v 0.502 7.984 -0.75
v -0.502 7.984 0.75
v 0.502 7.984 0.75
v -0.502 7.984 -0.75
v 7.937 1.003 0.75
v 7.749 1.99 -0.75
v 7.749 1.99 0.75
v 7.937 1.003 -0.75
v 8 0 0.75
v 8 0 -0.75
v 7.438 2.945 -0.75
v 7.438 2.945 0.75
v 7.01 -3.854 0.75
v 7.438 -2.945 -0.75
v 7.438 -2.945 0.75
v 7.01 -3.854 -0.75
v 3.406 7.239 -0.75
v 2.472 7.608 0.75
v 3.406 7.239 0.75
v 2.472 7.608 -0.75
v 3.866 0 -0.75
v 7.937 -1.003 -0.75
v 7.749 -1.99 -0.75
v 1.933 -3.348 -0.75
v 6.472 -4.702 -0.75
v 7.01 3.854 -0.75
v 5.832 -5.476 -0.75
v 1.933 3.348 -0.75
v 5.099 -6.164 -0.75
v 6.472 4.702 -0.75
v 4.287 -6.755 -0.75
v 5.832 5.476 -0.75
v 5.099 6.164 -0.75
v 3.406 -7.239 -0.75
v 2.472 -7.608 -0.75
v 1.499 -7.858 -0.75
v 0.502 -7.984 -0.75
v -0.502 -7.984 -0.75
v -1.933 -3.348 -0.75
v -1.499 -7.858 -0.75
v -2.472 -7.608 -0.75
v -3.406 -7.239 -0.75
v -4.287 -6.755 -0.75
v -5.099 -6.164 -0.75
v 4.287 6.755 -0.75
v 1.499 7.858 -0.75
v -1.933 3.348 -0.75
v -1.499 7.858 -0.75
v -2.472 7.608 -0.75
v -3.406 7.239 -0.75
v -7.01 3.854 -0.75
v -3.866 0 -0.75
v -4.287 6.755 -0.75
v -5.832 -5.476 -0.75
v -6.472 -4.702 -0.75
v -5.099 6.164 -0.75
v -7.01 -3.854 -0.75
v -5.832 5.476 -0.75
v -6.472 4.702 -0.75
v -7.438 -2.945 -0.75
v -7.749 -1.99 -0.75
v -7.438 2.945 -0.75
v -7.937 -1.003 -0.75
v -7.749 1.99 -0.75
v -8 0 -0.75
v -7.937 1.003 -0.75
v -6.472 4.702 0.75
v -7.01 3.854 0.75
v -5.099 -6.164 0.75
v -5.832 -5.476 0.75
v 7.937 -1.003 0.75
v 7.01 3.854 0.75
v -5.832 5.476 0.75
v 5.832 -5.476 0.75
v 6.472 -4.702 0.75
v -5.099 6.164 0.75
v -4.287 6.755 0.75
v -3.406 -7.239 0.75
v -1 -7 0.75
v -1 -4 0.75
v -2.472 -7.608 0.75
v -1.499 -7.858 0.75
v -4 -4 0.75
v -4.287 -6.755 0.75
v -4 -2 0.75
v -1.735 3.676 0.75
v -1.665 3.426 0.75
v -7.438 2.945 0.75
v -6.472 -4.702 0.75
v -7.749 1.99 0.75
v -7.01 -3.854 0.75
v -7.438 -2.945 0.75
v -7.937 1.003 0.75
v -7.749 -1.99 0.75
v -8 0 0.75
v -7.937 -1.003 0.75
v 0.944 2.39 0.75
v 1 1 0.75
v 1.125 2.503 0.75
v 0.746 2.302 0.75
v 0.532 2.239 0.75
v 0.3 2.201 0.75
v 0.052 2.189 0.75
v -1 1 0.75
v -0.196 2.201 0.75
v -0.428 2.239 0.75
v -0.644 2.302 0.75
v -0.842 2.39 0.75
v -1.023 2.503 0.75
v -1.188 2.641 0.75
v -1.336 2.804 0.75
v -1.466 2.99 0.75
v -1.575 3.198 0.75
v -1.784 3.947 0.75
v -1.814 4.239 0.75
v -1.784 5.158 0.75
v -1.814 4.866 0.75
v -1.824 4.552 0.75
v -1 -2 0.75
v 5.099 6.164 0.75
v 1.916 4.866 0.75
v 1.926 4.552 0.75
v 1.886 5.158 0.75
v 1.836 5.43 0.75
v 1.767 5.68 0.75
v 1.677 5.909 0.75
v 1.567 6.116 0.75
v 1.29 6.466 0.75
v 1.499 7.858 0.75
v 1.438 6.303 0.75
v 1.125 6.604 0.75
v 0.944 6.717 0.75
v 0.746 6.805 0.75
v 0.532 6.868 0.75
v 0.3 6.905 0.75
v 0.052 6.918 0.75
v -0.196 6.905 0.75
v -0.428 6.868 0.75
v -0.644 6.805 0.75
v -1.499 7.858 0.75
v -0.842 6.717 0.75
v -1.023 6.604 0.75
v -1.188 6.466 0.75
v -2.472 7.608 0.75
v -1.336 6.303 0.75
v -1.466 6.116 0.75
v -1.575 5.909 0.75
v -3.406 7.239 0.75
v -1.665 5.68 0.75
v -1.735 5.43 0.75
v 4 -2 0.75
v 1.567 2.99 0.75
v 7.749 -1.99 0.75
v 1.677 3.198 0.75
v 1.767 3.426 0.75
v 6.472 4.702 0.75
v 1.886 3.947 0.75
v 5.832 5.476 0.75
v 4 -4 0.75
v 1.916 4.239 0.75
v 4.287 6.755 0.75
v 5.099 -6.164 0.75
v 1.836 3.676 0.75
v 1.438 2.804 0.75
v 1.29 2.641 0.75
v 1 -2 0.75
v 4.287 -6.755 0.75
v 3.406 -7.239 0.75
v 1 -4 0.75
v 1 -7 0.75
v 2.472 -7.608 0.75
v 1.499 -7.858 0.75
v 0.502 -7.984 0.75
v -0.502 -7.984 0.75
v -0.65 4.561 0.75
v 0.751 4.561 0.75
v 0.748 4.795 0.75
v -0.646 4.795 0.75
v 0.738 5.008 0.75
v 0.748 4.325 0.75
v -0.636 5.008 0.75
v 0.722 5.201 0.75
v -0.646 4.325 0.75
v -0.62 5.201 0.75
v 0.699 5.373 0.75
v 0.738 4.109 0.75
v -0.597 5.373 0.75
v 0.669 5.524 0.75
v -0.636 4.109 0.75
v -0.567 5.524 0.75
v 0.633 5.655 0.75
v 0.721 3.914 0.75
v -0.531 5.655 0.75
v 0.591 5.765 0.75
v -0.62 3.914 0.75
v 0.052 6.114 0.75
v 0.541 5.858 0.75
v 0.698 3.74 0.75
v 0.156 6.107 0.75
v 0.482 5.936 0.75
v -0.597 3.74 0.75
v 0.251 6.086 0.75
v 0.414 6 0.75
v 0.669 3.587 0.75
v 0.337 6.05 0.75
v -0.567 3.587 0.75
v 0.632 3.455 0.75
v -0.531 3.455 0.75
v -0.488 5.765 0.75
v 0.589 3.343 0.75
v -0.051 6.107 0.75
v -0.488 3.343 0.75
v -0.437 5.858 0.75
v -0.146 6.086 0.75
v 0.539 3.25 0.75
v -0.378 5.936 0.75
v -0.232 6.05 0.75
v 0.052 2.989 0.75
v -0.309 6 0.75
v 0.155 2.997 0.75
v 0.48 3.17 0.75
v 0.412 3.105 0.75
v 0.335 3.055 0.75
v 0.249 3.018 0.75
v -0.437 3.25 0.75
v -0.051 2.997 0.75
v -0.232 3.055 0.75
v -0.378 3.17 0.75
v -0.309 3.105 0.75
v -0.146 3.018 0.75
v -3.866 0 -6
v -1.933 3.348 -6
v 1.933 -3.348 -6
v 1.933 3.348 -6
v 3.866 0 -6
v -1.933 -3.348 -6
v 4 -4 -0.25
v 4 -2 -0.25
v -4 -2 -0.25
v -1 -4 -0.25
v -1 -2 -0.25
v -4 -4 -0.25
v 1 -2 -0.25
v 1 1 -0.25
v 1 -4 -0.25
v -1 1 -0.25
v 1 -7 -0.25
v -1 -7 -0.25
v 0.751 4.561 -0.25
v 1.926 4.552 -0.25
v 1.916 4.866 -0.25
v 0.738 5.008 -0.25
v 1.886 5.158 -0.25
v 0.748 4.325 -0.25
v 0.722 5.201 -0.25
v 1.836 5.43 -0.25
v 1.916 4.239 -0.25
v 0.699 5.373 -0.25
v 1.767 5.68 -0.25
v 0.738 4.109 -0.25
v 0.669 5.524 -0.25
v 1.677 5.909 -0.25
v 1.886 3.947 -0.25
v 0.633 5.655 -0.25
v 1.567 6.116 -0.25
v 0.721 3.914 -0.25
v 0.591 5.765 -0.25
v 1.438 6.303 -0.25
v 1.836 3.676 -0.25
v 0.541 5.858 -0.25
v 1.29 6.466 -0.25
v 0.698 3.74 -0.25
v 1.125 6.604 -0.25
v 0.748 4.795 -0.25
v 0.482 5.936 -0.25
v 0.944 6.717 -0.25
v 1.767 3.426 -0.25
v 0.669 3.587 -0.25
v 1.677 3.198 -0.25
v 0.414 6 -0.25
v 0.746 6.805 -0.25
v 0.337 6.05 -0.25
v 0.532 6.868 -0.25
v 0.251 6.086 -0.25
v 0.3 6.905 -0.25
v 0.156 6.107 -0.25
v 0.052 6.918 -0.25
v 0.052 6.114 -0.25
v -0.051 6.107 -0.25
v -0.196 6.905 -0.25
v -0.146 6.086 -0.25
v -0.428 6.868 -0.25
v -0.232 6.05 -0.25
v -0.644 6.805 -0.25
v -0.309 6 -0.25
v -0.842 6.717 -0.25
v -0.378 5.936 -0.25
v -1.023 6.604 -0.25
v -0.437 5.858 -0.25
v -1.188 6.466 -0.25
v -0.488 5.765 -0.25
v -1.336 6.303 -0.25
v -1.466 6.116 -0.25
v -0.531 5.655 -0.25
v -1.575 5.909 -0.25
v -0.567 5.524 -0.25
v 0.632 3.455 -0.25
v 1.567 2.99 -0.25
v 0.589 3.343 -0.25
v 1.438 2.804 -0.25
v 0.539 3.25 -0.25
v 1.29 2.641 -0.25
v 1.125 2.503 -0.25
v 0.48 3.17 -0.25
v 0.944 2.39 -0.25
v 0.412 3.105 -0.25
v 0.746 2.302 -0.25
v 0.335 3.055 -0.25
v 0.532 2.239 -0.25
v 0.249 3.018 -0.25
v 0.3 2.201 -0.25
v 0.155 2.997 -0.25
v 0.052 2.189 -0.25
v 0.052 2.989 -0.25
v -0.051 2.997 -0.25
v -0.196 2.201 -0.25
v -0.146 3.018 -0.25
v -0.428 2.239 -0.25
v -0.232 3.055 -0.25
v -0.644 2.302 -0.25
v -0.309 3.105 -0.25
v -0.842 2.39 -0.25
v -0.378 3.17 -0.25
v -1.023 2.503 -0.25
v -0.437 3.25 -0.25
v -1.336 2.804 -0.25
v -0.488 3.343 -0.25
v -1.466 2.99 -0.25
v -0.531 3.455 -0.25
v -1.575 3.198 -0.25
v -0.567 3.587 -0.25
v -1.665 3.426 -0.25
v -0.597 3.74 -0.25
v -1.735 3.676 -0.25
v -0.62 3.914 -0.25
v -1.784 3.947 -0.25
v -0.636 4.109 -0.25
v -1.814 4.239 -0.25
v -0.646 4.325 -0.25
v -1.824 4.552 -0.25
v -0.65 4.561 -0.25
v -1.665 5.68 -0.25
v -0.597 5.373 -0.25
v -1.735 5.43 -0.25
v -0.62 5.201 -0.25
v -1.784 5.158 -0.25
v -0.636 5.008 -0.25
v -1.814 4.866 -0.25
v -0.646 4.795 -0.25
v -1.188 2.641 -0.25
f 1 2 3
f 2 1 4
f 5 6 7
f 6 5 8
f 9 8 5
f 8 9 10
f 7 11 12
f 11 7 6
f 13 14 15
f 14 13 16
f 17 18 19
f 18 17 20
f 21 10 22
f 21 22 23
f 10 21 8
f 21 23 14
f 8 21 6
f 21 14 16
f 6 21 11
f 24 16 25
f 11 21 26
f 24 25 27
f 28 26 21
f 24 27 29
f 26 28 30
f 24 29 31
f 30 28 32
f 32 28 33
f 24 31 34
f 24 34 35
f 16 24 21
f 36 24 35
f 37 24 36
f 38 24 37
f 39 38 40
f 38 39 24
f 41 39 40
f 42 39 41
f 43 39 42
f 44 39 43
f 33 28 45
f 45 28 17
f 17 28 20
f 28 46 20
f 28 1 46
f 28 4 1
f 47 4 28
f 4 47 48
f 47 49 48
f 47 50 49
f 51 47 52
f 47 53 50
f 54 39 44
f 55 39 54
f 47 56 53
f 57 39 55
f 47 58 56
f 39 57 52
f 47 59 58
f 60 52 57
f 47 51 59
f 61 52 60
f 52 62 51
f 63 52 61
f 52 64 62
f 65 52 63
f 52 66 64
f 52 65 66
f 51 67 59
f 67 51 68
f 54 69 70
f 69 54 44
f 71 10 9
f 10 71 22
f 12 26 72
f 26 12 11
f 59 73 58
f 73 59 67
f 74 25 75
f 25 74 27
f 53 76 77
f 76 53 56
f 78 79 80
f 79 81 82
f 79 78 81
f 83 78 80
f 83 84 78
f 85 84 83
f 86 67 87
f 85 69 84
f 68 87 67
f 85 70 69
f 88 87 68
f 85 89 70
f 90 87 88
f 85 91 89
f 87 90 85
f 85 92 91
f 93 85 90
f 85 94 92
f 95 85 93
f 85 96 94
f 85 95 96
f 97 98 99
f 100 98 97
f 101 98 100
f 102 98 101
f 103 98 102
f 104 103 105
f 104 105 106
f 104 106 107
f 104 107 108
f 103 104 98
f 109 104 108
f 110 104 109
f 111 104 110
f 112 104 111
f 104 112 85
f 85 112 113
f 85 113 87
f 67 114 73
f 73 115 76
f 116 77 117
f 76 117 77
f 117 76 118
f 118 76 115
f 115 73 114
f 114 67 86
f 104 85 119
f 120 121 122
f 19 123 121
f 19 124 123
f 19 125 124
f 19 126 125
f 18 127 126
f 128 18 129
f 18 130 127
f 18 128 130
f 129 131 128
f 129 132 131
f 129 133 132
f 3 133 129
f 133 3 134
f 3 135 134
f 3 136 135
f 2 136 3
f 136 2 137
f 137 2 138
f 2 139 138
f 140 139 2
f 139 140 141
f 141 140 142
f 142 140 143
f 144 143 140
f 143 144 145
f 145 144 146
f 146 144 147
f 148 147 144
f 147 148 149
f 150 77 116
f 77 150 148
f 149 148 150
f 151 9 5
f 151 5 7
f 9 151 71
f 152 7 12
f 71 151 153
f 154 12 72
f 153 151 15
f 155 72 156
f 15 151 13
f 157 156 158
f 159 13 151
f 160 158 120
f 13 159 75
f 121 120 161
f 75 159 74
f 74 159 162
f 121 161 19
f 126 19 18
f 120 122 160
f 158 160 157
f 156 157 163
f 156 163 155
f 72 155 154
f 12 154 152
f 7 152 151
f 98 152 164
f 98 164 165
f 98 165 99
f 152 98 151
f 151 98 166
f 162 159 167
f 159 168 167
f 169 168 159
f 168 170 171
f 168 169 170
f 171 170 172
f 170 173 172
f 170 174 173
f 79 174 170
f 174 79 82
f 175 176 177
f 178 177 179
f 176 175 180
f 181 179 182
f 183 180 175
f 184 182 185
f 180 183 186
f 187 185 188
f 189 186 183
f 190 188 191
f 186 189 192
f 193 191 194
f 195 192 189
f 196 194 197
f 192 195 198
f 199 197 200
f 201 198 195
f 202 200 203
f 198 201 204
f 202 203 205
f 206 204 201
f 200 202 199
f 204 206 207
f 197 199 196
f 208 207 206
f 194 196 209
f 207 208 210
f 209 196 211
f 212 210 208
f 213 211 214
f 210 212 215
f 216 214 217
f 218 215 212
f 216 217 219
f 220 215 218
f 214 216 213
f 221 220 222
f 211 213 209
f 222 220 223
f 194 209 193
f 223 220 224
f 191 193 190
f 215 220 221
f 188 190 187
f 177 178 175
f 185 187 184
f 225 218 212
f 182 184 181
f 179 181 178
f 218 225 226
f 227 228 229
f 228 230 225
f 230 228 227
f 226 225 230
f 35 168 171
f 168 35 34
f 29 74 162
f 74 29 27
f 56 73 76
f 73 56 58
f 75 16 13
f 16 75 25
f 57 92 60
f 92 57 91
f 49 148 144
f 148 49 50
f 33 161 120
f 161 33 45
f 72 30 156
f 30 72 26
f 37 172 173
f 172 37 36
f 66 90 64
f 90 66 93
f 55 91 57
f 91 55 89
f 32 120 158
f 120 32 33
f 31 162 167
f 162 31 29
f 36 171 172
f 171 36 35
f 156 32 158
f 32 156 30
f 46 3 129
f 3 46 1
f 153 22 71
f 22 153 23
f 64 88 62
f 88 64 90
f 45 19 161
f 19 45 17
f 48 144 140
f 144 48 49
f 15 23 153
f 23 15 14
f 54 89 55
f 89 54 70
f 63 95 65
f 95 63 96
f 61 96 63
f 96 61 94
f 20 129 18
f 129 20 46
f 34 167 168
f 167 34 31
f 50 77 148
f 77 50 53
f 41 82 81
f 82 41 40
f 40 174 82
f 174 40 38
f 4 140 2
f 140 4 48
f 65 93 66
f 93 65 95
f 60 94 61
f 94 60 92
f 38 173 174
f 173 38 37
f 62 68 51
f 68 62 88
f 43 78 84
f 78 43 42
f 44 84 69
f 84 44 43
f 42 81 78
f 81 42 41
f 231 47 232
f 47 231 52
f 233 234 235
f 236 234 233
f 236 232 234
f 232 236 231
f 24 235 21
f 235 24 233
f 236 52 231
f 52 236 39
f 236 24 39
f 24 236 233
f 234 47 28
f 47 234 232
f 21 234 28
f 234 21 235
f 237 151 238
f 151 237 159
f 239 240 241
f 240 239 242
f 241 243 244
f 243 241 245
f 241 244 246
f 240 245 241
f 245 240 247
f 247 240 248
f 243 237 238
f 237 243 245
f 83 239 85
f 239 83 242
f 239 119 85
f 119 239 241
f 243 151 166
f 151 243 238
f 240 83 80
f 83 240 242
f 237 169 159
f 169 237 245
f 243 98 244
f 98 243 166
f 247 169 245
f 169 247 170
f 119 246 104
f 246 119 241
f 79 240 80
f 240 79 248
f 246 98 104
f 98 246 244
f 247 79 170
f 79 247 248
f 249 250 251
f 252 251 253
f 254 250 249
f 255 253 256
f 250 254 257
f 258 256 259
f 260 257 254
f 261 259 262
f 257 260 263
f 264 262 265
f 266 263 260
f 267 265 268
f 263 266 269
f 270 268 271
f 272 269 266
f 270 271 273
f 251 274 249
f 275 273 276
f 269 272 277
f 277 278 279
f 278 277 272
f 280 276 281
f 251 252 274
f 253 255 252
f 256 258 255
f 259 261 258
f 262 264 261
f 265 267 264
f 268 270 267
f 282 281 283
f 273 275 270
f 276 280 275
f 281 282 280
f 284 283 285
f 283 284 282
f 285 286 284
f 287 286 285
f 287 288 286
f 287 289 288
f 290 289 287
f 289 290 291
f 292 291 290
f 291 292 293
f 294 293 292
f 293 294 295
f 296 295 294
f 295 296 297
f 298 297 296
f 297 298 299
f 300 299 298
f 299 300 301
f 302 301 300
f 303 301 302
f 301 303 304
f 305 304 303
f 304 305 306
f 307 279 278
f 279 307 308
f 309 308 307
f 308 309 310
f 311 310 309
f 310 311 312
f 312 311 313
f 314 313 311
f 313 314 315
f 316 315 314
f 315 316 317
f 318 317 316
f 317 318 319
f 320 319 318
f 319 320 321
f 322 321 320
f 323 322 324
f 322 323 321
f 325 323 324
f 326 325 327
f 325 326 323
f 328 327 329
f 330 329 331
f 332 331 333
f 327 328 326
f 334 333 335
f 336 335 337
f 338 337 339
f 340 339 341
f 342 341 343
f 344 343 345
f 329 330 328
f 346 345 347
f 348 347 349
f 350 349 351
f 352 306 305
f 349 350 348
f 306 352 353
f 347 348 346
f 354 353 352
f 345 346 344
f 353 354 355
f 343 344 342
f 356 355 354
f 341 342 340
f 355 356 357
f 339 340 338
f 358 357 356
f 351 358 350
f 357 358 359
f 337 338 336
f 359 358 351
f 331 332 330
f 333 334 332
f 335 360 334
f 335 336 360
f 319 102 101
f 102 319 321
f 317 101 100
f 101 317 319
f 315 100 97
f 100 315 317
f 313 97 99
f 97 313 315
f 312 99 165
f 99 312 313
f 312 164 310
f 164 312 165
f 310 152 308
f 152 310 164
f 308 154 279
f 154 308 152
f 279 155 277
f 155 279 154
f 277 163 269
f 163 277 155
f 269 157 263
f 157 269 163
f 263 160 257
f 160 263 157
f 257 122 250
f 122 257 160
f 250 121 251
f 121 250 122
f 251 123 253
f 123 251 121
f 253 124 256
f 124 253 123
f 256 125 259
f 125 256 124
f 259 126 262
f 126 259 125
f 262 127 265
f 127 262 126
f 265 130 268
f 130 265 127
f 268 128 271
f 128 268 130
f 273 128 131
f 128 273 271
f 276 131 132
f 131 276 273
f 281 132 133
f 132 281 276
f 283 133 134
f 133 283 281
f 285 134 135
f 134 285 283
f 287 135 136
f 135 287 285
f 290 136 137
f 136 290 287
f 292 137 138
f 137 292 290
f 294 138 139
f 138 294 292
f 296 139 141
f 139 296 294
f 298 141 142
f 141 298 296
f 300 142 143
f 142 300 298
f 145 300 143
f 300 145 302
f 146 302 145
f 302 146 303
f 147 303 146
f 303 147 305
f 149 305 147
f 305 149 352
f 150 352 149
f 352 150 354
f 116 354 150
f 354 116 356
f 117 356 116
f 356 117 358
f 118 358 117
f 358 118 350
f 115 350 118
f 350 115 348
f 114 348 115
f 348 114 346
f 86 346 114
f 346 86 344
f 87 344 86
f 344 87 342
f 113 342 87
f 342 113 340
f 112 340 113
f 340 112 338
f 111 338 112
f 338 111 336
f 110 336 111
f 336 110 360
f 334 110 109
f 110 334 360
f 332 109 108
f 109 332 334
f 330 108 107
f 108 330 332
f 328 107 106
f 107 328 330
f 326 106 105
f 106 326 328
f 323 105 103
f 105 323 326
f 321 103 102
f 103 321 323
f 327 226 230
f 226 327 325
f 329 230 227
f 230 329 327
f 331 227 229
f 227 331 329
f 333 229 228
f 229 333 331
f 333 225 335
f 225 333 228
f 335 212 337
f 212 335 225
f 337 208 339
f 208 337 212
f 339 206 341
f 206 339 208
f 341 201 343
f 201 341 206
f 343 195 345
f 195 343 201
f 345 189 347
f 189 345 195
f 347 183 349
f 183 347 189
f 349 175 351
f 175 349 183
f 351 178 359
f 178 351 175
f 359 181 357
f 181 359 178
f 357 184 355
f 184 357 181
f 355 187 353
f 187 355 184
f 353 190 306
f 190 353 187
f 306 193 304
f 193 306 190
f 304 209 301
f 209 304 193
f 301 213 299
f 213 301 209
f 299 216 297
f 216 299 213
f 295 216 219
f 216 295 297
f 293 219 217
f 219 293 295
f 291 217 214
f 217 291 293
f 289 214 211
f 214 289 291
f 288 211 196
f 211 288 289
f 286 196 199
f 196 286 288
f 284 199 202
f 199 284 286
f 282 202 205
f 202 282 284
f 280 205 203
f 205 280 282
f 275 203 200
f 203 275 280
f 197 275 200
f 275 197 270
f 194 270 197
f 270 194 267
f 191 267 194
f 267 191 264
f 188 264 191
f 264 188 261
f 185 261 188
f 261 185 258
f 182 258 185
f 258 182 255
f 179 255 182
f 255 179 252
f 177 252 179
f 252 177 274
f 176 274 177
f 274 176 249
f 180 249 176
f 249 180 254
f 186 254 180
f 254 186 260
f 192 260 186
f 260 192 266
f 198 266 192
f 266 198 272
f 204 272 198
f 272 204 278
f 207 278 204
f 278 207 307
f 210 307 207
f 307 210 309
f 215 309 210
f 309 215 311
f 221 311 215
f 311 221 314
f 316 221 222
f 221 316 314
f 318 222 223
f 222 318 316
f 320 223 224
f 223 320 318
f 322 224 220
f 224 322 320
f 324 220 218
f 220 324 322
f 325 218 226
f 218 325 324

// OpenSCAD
$fn = 50;


difference() {
	union() {
		translate(v = [0, 0, -0.7500000000]) {
			cylinder(h = 1.5000000000, r = 8.0000000000);
		}
		translate(v = [0, 0, -6]) {
			linear_extrude(height = 6) {
				polygon(points = [[3.8658550000, 0.0000000000], [1.9329275000, 3.3479286373], [-1.9329275000, 3.3479286373], [-3.8658550000, 0.0000000000], [-1.9329275000, -3.3479286373], [1.9329275000, -3.3479286373]]);
			}
		}
	}
	union() {
		#translate(v = [-4.0000000000, -4.0000000000, -0.2500000000]) {
			cube(size = [8, 2, 1]);
		}
		#translate(v = [-1.0000000000, -7.0000000000, -0.2500000000]) {
			cube(size = [2, 8, 1]);
		}
		#translate(v = [0, 4.5000000000, -0.2500000000]) {
			linear_extrude(height = 1) {
				text(font = "SegoiUI:Bold", halign = "center", size = 4.5000000000, text = "0", valign = "center");
			}
		}
	}
}
